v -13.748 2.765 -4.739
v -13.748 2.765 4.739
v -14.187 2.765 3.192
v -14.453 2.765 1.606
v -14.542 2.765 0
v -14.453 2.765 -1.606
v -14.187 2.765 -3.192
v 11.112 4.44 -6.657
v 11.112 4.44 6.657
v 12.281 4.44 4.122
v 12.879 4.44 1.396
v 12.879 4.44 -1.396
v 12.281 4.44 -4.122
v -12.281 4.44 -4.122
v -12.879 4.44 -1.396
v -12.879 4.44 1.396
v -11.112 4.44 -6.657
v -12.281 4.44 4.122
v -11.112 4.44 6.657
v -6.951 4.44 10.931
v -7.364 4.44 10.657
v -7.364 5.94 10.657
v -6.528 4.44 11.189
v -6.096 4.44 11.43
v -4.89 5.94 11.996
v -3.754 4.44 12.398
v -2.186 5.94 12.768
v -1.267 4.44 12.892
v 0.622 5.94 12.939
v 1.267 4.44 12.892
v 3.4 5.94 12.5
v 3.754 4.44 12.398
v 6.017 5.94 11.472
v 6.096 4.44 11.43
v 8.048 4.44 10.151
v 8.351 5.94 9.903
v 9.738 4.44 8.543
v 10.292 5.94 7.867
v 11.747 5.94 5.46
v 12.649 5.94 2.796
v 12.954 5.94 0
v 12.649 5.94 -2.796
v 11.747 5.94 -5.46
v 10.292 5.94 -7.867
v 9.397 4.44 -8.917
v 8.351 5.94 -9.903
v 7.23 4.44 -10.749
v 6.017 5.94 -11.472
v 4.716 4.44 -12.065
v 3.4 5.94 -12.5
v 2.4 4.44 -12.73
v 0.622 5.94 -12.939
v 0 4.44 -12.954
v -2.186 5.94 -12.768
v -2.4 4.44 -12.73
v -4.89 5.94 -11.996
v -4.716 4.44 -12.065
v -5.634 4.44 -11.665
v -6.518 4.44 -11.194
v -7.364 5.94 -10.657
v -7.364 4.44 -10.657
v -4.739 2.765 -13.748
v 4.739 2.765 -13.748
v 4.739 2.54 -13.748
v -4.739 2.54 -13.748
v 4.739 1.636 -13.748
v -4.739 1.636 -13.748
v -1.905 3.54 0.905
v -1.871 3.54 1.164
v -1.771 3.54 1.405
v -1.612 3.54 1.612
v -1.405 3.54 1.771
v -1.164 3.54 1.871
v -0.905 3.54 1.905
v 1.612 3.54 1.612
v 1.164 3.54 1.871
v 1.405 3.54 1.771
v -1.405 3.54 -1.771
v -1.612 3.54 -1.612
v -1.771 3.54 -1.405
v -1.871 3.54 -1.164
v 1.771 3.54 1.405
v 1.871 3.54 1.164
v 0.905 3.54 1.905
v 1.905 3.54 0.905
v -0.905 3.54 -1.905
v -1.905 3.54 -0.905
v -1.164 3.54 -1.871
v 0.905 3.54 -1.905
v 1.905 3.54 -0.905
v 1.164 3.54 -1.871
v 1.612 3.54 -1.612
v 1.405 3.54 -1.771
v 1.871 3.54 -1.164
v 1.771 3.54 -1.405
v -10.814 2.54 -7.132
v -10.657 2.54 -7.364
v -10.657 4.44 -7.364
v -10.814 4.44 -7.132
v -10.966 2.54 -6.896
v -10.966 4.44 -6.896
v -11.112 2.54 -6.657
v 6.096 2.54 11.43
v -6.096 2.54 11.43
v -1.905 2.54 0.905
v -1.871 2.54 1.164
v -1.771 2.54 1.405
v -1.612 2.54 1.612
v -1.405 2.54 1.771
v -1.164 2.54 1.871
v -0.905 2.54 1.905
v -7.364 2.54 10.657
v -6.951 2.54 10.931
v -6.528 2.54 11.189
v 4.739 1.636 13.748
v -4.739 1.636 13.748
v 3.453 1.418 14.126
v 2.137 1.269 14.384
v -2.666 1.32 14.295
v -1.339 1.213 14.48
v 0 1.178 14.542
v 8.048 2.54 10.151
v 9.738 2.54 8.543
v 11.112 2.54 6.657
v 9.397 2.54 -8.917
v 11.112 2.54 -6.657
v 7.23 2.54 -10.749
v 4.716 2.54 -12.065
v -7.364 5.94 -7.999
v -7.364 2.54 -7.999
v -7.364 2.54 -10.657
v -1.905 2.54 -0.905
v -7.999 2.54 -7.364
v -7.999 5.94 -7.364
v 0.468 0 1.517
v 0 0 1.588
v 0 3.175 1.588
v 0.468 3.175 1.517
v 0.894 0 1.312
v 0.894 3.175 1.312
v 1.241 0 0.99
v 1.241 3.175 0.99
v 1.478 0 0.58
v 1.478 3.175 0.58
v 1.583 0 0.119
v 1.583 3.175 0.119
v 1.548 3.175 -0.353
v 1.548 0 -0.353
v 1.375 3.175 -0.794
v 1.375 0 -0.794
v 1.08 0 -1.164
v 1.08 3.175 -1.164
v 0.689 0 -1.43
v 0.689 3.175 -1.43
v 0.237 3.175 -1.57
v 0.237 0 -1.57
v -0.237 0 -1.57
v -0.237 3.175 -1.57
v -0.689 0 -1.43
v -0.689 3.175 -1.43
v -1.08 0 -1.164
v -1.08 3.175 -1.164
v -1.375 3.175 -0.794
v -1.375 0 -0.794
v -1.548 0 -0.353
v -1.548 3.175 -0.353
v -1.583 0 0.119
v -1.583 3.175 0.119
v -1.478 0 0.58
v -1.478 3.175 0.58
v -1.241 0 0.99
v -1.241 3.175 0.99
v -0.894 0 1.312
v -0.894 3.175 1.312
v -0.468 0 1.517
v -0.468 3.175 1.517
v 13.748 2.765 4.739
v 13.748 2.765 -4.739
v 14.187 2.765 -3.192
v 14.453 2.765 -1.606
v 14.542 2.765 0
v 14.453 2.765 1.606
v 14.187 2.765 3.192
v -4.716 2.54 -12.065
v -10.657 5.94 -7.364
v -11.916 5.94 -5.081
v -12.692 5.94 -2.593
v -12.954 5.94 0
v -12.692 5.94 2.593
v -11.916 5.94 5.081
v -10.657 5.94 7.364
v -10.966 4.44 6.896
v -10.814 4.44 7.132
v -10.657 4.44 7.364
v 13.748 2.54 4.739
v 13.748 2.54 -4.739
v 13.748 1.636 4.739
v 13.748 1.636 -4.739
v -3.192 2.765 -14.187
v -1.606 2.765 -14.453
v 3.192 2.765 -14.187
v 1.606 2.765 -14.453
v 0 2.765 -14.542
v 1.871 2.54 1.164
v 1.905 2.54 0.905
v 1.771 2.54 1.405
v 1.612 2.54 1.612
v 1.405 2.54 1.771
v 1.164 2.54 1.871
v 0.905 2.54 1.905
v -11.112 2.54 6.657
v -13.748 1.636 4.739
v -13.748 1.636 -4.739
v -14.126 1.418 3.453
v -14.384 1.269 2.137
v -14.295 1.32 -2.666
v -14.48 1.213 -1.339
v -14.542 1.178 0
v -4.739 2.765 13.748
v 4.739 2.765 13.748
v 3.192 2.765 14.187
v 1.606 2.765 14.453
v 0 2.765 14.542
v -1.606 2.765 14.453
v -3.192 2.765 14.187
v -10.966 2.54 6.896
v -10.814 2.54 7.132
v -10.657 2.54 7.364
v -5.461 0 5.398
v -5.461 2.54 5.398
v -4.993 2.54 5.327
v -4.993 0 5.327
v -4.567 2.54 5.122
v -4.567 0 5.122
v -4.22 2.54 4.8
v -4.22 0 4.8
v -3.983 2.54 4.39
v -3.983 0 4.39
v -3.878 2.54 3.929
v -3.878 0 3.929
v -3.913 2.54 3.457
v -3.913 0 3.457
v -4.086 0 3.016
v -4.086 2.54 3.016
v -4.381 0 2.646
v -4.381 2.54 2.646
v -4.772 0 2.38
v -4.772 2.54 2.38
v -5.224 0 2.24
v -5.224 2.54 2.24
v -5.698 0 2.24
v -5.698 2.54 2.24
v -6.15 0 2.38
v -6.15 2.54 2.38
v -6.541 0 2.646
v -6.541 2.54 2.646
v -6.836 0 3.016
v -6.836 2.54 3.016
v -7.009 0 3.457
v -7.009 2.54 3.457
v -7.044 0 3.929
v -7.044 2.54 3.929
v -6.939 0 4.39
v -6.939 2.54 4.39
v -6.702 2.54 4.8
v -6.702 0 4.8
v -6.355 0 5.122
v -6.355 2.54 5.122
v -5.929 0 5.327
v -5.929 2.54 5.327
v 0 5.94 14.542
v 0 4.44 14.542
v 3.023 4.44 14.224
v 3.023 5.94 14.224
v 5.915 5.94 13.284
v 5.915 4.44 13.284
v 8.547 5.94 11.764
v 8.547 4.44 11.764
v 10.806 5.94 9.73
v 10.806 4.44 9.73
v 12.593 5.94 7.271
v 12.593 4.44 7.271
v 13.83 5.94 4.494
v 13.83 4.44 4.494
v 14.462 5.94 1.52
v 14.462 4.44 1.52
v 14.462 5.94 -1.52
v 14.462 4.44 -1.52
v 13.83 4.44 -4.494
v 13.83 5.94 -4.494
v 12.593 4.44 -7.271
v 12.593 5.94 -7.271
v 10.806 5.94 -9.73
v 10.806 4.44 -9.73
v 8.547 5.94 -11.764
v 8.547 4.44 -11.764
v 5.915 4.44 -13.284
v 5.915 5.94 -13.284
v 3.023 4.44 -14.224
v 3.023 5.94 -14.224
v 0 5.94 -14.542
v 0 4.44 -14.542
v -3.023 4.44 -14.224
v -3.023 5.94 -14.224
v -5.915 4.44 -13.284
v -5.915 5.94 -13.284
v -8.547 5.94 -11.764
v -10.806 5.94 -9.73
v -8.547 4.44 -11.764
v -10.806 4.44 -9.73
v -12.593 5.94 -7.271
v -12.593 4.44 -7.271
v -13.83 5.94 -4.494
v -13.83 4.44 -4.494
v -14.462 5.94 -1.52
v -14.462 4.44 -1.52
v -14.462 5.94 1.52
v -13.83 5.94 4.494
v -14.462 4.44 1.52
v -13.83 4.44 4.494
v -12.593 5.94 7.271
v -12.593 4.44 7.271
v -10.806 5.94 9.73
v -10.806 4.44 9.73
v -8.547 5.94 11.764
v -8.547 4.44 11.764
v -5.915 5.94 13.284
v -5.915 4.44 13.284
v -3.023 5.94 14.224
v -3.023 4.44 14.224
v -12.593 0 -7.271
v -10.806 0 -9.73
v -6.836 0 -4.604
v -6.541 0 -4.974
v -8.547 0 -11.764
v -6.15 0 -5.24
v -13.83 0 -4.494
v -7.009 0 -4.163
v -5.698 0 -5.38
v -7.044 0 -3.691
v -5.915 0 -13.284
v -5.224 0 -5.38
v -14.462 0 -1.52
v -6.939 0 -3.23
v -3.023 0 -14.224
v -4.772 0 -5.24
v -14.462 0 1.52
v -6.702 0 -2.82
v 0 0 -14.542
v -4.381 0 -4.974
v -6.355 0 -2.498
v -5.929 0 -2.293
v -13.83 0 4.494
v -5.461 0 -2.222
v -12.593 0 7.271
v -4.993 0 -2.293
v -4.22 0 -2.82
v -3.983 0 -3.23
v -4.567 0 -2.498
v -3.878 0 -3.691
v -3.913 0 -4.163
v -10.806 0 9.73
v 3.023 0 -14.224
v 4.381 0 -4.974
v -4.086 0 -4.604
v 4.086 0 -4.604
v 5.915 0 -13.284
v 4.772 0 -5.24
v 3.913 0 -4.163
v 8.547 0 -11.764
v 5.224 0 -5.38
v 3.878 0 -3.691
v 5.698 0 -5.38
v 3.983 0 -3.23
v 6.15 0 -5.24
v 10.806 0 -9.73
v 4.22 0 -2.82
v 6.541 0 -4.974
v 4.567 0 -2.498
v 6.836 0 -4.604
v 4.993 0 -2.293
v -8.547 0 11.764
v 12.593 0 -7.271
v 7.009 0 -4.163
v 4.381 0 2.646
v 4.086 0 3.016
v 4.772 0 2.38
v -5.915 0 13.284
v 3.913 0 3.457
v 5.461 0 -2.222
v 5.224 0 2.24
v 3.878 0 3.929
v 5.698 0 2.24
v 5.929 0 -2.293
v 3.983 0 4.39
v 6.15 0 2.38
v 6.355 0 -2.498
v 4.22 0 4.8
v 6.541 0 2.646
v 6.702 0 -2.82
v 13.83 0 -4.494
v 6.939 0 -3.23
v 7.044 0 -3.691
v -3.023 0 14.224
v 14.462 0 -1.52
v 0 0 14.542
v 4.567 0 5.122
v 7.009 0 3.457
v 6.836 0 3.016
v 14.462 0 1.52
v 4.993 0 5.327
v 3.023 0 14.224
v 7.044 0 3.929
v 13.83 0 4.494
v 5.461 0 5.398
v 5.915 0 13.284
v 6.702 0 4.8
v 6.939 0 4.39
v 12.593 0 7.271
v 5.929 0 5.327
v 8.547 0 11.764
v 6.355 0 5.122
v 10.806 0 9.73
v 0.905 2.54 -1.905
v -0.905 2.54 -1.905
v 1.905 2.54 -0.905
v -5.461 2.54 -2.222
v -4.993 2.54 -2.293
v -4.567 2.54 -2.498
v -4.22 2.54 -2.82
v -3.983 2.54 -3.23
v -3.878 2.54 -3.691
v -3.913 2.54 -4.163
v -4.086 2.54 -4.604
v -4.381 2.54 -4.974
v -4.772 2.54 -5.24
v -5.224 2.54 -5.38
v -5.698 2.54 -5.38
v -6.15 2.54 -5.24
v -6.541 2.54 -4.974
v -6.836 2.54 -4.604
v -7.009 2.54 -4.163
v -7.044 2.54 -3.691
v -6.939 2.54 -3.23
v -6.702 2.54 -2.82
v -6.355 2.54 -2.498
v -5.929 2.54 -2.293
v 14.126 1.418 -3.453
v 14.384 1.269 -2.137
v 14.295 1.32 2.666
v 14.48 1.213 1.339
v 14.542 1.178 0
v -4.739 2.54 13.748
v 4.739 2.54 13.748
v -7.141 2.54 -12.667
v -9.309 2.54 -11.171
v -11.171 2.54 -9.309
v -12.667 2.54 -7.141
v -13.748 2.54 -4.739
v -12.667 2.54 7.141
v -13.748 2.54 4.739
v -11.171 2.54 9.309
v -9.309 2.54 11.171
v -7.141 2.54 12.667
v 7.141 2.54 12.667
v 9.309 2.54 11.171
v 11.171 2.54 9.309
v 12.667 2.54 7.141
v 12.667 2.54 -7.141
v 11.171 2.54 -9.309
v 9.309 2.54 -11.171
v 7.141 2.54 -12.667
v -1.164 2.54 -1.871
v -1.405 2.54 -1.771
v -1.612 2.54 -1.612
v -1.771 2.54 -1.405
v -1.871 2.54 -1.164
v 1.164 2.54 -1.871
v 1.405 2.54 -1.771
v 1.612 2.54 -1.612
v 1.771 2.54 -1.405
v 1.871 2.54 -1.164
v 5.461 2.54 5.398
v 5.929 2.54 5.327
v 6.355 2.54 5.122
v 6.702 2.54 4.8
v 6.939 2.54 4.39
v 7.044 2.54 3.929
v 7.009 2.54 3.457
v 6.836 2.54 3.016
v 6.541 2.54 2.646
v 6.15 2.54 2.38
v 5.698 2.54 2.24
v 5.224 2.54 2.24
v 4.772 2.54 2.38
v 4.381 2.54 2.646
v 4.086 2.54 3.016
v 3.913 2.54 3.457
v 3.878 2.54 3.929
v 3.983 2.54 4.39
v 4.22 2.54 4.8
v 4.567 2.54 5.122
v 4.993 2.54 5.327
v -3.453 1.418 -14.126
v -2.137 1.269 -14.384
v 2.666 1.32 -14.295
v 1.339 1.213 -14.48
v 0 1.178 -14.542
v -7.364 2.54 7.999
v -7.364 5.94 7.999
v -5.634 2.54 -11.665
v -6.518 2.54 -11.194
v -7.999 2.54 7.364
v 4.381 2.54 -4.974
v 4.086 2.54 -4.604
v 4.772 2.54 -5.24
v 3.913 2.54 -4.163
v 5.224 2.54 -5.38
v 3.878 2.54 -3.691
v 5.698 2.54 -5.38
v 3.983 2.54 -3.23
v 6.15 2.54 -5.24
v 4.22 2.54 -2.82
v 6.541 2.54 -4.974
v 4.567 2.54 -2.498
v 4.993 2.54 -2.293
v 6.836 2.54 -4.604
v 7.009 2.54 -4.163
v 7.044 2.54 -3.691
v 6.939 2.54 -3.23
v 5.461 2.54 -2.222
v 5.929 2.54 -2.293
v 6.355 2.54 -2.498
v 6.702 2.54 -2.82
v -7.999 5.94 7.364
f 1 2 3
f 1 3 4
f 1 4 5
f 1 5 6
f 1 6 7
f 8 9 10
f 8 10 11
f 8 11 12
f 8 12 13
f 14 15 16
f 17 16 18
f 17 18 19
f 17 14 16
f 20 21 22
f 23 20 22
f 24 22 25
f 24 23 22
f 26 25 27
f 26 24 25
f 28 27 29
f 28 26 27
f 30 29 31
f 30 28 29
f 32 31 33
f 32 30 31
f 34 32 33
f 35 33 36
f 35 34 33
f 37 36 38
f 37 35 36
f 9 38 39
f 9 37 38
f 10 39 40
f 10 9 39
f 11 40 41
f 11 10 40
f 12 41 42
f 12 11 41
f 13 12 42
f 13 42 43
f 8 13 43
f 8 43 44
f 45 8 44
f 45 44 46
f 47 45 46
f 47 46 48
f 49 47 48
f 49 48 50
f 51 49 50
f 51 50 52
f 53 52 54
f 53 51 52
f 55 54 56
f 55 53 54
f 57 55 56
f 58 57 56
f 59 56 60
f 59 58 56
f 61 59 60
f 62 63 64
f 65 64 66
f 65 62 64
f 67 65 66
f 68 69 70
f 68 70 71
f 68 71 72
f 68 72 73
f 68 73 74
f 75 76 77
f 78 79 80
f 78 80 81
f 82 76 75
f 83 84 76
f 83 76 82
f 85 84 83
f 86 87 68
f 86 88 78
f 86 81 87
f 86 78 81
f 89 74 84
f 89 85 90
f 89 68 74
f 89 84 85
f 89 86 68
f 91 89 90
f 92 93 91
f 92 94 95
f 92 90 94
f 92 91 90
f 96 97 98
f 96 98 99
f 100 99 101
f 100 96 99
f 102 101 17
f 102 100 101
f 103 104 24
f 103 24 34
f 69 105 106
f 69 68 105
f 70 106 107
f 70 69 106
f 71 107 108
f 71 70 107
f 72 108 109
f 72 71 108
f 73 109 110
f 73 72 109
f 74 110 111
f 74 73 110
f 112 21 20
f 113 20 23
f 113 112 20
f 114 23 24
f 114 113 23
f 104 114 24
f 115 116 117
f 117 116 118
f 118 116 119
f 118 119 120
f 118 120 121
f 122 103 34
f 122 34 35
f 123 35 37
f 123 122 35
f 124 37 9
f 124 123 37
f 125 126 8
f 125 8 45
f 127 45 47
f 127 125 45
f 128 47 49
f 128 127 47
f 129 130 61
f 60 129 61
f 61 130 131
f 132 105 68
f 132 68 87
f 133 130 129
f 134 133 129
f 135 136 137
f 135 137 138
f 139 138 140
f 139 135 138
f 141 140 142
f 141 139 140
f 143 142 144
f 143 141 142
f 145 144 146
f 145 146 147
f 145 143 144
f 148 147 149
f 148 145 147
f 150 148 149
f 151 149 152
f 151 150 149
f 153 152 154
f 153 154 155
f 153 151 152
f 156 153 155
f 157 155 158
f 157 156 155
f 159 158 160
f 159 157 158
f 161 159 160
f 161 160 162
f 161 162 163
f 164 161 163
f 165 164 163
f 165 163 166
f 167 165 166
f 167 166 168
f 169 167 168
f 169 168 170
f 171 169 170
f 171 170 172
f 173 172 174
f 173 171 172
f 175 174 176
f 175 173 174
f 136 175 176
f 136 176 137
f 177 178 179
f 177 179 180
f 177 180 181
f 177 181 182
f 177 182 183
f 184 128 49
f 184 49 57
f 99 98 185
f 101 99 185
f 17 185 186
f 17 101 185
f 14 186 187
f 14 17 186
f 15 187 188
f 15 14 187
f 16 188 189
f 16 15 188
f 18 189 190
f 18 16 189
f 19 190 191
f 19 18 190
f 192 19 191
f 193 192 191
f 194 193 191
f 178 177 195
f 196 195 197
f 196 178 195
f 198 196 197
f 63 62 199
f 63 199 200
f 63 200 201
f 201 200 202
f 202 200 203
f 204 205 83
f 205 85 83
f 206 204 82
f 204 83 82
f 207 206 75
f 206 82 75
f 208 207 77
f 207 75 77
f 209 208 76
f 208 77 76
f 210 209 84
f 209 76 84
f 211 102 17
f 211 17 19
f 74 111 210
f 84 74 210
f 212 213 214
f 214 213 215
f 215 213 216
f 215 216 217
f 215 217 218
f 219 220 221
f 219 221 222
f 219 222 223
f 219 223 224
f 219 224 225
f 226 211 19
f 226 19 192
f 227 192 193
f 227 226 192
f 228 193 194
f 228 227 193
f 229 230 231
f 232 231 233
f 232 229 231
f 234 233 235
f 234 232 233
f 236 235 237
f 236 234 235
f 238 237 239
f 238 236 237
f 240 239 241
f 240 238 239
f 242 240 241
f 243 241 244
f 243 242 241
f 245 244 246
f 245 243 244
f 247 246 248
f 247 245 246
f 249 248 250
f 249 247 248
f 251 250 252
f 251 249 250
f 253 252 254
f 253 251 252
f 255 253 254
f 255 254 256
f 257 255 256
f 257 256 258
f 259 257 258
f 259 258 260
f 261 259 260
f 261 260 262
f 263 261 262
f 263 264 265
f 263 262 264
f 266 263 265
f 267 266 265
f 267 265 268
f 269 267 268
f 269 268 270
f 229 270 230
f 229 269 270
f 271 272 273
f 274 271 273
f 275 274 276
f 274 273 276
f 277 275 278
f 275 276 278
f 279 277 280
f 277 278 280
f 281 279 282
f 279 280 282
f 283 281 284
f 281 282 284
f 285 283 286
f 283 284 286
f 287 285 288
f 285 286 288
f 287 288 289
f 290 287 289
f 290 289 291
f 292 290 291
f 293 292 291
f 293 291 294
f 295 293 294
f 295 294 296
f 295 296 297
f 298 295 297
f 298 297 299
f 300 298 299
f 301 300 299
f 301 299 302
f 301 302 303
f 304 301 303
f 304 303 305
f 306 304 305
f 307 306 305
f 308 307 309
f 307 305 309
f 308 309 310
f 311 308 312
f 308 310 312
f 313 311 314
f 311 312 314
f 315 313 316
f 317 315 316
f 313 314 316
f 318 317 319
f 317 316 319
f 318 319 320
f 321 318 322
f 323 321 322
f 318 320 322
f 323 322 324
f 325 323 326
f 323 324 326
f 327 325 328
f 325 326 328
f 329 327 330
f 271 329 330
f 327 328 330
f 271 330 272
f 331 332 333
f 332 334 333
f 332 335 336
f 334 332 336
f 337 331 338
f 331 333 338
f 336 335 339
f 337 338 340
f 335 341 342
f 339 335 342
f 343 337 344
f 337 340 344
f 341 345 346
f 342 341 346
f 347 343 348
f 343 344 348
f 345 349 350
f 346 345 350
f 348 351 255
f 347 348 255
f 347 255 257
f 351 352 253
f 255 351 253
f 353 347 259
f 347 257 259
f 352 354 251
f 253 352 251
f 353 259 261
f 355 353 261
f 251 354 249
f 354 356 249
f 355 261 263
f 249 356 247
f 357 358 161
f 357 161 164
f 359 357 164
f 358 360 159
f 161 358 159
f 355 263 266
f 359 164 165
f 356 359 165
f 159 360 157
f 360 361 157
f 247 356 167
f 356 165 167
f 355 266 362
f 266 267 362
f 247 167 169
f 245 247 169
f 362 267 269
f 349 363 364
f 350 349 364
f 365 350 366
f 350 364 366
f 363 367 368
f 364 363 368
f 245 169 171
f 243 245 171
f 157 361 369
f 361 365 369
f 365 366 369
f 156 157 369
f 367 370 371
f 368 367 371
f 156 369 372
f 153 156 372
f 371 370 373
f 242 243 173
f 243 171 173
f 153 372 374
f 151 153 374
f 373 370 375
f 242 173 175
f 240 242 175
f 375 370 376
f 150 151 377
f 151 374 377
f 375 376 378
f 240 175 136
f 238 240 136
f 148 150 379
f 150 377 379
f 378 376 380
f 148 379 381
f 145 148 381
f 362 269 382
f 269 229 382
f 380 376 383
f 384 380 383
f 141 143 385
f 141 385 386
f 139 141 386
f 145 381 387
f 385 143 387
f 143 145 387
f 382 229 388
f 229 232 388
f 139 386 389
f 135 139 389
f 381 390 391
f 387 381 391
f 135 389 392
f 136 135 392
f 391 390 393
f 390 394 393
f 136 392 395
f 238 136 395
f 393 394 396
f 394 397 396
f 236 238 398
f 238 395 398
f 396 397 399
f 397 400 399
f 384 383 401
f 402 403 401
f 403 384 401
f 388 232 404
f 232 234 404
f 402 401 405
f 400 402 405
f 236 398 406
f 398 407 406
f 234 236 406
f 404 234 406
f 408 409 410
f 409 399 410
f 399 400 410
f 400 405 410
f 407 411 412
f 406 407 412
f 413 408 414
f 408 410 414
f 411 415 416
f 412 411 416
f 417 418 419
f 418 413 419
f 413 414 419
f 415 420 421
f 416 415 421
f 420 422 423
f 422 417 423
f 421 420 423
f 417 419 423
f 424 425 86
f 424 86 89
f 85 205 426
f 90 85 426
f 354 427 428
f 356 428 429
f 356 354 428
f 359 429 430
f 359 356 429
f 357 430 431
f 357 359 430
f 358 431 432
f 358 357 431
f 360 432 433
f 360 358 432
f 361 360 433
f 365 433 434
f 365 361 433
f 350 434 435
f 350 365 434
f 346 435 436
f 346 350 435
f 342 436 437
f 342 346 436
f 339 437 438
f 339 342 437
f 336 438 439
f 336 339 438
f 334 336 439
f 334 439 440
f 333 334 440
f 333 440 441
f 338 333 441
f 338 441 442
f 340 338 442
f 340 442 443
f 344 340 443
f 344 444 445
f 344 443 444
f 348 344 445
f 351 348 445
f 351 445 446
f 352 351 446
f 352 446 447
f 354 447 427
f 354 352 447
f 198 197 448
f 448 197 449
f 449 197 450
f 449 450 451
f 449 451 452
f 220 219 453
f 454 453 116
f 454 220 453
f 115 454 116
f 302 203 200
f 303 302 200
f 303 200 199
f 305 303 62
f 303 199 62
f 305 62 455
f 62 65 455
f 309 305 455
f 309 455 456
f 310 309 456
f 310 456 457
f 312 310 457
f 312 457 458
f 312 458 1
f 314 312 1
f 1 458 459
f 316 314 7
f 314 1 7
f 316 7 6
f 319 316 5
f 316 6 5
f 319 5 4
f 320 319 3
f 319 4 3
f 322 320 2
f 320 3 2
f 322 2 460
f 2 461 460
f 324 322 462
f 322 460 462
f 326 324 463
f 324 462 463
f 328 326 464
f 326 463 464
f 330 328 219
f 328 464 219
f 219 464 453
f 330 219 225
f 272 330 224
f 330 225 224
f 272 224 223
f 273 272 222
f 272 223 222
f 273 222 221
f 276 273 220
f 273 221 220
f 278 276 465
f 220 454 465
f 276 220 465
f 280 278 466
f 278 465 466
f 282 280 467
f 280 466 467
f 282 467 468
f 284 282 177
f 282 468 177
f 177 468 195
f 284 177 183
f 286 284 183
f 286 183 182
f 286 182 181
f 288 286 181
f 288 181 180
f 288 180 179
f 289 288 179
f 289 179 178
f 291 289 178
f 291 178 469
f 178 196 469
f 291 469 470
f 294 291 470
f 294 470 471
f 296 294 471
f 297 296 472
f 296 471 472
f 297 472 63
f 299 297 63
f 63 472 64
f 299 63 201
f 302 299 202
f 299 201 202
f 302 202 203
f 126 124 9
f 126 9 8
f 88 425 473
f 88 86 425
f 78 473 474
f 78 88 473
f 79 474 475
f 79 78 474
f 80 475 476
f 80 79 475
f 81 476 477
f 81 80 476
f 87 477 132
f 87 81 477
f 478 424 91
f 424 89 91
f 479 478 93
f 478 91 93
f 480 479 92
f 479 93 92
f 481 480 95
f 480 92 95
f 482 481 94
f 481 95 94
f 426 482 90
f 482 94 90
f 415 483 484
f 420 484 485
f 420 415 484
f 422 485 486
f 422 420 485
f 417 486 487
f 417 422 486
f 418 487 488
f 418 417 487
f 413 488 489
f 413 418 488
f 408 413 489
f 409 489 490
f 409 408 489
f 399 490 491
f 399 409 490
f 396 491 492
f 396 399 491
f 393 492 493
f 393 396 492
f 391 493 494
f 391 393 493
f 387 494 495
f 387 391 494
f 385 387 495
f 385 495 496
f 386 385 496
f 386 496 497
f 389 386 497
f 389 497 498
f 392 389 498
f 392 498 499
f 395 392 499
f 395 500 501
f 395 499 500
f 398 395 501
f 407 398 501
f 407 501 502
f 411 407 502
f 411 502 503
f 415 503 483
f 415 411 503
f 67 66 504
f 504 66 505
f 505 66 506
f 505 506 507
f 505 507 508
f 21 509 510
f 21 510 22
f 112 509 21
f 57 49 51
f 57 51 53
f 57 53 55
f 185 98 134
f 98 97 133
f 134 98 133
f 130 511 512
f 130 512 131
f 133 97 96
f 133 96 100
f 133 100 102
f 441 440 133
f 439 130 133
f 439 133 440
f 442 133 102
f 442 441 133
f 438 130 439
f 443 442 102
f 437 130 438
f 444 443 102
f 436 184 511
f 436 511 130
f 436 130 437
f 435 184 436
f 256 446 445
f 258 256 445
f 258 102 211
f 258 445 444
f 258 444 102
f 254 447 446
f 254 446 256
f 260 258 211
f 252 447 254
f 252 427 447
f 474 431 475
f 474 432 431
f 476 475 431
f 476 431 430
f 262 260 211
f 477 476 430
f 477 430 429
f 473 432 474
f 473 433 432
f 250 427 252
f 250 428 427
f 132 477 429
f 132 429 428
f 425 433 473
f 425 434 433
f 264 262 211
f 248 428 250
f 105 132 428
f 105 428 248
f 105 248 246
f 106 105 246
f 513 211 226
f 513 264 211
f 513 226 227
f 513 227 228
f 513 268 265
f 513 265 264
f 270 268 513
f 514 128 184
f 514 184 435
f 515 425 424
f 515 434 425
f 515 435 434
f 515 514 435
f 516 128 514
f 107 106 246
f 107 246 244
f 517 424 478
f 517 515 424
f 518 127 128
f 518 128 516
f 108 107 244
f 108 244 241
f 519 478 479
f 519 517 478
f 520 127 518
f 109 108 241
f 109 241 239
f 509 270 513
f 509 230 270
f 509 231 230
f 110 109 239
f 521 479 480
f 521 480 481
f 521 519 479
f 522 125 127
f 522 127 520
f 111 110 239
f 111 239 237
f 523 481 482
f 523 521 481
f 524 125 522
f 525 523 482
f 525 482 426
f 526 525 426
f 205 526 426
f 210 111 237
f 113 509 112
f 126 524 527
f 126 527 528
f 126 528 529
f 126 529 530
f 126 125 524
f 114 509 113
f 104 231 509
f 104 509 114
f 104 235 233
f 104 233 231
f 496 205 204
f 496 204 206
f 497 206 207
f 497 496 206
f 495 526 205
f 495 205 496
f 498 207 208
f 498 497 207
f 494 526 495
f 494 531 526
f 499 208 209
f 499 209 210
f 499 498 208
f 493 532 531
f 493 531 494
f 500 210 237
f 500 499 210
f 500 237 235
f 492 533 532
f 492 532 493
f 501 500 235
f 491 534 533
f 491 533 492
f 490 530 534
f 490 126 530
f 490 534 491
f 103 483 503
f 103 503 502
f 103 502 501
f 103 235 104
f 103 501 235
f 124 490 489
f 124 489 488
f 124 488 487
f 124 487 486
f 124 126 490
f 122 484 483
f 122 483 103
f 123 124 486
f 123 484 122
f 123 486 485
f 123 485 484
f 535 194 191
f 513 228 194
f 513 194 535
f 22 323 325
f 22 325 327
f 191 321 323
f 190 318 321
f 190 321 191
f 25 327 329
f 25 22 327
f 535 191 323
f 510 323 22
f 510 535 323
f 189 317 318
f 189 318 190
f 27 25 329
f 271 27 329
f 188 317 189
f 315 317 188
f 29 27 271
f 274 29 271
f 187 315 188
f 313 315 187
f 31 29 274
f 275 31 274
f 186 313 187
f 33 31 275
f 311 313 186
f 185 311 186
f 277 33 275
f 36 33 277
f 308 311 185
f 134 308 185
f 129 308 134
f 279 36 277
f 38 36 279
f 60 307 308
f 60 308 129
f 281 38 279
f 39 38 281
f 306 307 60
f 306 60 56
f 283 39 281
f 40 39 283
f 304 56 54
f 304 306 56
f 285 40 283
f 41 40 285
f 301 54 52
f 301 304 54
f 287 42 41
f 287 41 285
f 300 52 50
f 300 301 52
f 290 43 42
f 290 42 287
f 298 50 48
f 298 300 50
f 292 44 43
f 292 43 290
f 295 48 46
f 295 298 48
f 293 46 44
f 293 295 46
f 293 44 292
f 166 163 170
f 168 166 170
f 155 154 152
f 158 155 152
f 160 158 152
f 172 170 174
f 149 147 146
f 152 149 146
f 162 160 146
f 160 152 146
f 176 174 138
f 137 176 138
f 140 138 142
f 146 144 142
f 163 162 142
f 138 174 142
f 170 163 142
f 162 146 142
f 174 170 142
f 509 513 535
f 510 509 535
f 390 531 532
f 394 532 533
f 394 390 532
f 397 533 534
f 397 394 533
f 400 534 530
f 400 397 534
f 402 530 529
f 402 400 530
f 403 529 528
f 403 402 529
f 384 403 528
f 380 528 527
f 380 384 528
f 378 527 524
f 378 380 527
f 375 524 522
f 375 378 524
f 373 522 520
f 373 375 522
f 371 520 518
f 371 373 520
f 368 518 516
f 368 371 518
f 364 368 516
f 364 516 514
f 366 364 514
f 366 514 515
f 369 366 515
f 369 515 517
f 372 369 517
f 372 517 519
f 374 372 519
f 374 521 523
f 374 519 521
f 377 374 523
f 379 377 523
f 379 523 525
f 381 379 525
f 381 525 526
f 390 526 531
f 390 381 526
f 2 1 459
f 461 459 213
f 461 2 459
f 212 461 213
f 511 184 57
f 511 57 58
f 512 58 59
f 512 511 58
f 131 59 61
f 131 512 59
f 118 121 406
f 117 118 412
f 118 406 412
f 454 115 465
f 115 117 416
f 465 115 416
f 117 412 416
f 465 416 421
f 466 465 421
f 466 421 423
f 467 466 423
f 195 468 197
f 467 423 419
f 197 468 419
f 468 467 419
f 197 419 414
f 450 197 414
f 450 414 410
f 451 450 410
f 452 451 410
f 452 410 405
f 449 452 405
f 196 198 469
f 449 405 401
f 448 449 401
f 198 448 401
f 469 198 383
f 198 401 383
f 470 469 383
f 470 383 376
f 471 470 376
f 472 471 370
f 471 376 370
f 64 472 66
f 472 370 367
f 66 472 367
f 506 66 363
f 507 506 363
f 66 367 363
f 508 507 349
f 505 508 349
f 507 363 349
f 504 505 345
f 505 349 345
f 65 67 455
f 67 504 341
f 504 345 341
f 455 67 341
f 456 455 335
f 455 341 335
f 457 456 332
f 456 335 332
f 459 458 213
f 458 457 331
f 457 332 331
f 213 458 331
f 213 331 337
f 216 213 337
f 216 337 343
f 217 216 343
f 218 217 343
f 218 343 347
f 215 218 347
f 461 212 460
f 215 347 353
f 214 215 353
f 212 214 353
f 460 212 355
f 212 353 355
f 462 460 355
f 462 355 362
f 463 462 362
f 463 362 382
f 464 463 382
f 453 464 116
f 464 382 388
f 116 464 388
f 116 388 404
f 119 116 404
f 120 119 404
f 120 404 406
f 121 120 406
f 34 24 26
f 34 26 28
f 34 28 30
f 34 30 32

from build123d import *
from build123d.topology import SkipClean

# Parameters (mm, degrees)
SKETCH1_R           = 14.5415
BOSS_EXTRUDE2_DEPTH = 2.54
BOSS_EXTRUDE4_START = 2.54
SKETCH1_8_W         = 3.81
SKETCH1_8_H         = 3.81
BOSS_EXTRUDE4_DEPTH = 1
BOSS_EXTRUDE3_START = 2.54
SKETCH1_6_R         = 14.5415
BOSS_EXTRUDE3_DEPTH = 1.9
SKETCH1_9_R         = 1.5875
CUT_EXTRUDE2_DEPTH  = 3.175
SKETCH2_R           = 14.5415
SKETCH2_R_2         = 12.954
BOSS_EXTRUDE5_DEPTH = 1.5
BOSS_EXTRUDE6_DEPTH = 3.4
FILLET1_R           = 1
CHAMFER1_SIZE       = 0.635
CUT_EXTRUDE3_DEPTH  = 22.405467631
CIRPATTERN1_COUNT   = 4


with BuildPart() as part:
    # Sketch1 → Boss-Extrude2 (new body)
    with BuildSketch(Plane(origin=(0, 0, 0), x_dir=(1, 0, 0), z_dir=(0, 1, 0))):
        with Locations(Location((0, 0, 0), (0, 0, 270))):
            Circle(SKETCH1_R)
    extrude(amount=BOSS_EXTRUDE2_DEPTH)

    # Sketch1<8> → Boss-Extrude4 (add)
    with BuildSketch(Plane(origin=(0, 0, 0), x_dir=(1, 0, 0), z_dir=(0, 1, 0)).offset(BOSS_EXTRUDE4_START)):
        Rectangle(SKETCH1_8_W, SKETCH1_8_H)
    extrude(amount=BOSS_EXTRUDE4_DEPTH)

    # Sketch1<6> → Boss-Extrude3 (add)
    with BuildSketch(Plane(origin=(0, 0, 0), x_dir=(1, 0, 0), z_dir=(0, 1, 0)).offset(BOSS_EXTRUDE3_START)):
        with Locations(Location((0, 0, 0), (0, 0, 90))):
            Circle(SKETCH1_6_R)
        with BuildLine():
            ThreePointArc((6.096, -11.43), (8.929053506, -9.384994379), (11.1125, -6.657211109))
            Line((11.1125, -6.657211109), (11.1125, 6.657211109))
            ThreePointArc((11.1125, 6.657211109), (8.363458286, 9.8923547), (4.716130935, 12.065))
            Line((4.716130935, 12.065), (-4.716130935, 12.065))
            ThreePointArc((-4.716130935, 12.065), (-8.363458286, 9.8923547), (-11.1125, 6.657211109))
            Line((-11.1125, 6.657211109), (-11.1125, -6.657211109))
            ThreePointArc((-11.1125, -6.657211109), (-8.929053506, -9.384994379), (-6.096, -11.43))
            Line((-6.096, -11.43), (6.096, -11.43))
        make_face(mode=Mode.SUBTRACT)
    extrude(amount=BOSS_EXTRUDE3_DEPTH)

    # Sketch1<9> → Cut-Extrude2 (cut)
    with BuildSketch(Plane(origin=(0, 0, 0), x_dir=(1, 0, 0), z_dir=(0, 1, 0))):
        with Locations(Location((0, 0, 0), (0, 0, 270))):
            Circle(SKETCH1_9_R)
        with Locations(Location((-5.461, 3.81, 0), (0, 0, 270))):
            Circle(SKETCH1_9_R)
        with Locations(Location((5.461, 3.81, 0), (0, 0, 270))):
            Circle(SKETCH1_9_R)
        with Locations(Location((5.461, -3.81, 0), (0, 0, 270))):
            Circle(SKETCH1_9_R)
        with Locations(Location((-5.461, -3.81, 0), (0, 0, 270))):
            Circle(SKETCH1_9_R)
    extrude(amount=CUT_EXTRUDE2_DEPTH, mode=Mode.SUBTRACT)

    # Sketch2 → Boss-Extrude5 (add)
    with BuildSketch(Plane(origin=(0, 4.44, 0), x_dir=(1, 0, 0), z_dir=(0, 1, 0))):
        with Locations(Location((0, 0, 0), (0, 0, 270))):
            Circle(SKETCH2_R)
        with Locations(Location((0, 0, 0), (0, 0, 68.649791106))):
            Circle(SKETCH2_R_2, mode=Mode.SUBTRACT)
    extrude(amount=BOSS_EXTRUDE5_DEPTH)

    # Sketch3 → Boss-Extrude6 (add)
    with BuildSketch(Plane(origin=(0, 2.54, 0), x_dir=(1, 0, 0), z_dir=(0, 1, 0))):
        with BuildLine():
            Line((-10.657411412, 7.363810019), (-7.363810019, 7.363810019))
            Line((-7.363810019, 7.363810019), (-7.363810019, 10.657411412))
            ThreePointArc((-7.363810019, 10.657411412), (-9.159861243, 9.159861243), (-10.657411412, 7.363810019))
        make_face()
        with BuildLine():
            Line((-10.657411412, -7.363810019), (-7.363810019, -7.363810019))
            Line((-7.363810019, -7.363810019), (-7.363810019, -10.657411412))
            ThreePointArc((-7.363810019, -10.657411412), (-9.159861243, -9.159861243), (-10.657411412, -7.363810019))
        make_face()
    extrude(amount=BOSS_EXTRUDE6_DEPTH)

    # Fillet1
    fillet1_edges = [part.edges().sort_by_distance(p)[0] for p in [
        (1.905, 3.04, -1.905),
        (-1.905, 3.04, -1.905),
        (-1.905, 3.04, 1.905),
        (1.905, 3.04, 1.905),
    ]]
    fillet(fillet1_edges, radius=FILLET1_R)

    # Chamfer1
    chamfer1_edges = [part.edges().sort_by_distance(p)[0] for p in [
        (-7.363810019, 4.24, 7.363810019),
        (-7.363810019, 4.24, -7.363810019),
    ]]
    chamfer(chamfer1_edges, length=CHAMFER1_SIZE)

    # Sketch4 → Cut-Extrude3 (cut, symmetric)
    with SkipClean():  # the faces are left unmerged after this step: merging them gives an invalid solid
        with BuildSketch(Plane.XY):
            Polygon((-14.5415, 2.765), (-13.74775, 2.765), (-13.74775, 1.635771776), (-14.5415, 1.1775), align=None)
        cut_extrude3 = extrude(amount=CUT_EXTRUDE3_DEPTH, both=True, mode=Mode.SUBTRACT)

    # CirPattern1: Cut-Extrude3 ×4 about axis
    with SkipClean():  # the faces are left unmerged after this step: merging them gives an invalid solid
        cirpattern1_axis = Axis((0, 0, 0), (0, 1, 0))
        for i in range(1, CIRPATTERN1_COUNT):
            add(cut_extrude3.rotate(cirpattern1_axis, i * 360 / CIRPATTERN1_COUNT), mode=Mode.SUBTRACT)


solid = part.part
